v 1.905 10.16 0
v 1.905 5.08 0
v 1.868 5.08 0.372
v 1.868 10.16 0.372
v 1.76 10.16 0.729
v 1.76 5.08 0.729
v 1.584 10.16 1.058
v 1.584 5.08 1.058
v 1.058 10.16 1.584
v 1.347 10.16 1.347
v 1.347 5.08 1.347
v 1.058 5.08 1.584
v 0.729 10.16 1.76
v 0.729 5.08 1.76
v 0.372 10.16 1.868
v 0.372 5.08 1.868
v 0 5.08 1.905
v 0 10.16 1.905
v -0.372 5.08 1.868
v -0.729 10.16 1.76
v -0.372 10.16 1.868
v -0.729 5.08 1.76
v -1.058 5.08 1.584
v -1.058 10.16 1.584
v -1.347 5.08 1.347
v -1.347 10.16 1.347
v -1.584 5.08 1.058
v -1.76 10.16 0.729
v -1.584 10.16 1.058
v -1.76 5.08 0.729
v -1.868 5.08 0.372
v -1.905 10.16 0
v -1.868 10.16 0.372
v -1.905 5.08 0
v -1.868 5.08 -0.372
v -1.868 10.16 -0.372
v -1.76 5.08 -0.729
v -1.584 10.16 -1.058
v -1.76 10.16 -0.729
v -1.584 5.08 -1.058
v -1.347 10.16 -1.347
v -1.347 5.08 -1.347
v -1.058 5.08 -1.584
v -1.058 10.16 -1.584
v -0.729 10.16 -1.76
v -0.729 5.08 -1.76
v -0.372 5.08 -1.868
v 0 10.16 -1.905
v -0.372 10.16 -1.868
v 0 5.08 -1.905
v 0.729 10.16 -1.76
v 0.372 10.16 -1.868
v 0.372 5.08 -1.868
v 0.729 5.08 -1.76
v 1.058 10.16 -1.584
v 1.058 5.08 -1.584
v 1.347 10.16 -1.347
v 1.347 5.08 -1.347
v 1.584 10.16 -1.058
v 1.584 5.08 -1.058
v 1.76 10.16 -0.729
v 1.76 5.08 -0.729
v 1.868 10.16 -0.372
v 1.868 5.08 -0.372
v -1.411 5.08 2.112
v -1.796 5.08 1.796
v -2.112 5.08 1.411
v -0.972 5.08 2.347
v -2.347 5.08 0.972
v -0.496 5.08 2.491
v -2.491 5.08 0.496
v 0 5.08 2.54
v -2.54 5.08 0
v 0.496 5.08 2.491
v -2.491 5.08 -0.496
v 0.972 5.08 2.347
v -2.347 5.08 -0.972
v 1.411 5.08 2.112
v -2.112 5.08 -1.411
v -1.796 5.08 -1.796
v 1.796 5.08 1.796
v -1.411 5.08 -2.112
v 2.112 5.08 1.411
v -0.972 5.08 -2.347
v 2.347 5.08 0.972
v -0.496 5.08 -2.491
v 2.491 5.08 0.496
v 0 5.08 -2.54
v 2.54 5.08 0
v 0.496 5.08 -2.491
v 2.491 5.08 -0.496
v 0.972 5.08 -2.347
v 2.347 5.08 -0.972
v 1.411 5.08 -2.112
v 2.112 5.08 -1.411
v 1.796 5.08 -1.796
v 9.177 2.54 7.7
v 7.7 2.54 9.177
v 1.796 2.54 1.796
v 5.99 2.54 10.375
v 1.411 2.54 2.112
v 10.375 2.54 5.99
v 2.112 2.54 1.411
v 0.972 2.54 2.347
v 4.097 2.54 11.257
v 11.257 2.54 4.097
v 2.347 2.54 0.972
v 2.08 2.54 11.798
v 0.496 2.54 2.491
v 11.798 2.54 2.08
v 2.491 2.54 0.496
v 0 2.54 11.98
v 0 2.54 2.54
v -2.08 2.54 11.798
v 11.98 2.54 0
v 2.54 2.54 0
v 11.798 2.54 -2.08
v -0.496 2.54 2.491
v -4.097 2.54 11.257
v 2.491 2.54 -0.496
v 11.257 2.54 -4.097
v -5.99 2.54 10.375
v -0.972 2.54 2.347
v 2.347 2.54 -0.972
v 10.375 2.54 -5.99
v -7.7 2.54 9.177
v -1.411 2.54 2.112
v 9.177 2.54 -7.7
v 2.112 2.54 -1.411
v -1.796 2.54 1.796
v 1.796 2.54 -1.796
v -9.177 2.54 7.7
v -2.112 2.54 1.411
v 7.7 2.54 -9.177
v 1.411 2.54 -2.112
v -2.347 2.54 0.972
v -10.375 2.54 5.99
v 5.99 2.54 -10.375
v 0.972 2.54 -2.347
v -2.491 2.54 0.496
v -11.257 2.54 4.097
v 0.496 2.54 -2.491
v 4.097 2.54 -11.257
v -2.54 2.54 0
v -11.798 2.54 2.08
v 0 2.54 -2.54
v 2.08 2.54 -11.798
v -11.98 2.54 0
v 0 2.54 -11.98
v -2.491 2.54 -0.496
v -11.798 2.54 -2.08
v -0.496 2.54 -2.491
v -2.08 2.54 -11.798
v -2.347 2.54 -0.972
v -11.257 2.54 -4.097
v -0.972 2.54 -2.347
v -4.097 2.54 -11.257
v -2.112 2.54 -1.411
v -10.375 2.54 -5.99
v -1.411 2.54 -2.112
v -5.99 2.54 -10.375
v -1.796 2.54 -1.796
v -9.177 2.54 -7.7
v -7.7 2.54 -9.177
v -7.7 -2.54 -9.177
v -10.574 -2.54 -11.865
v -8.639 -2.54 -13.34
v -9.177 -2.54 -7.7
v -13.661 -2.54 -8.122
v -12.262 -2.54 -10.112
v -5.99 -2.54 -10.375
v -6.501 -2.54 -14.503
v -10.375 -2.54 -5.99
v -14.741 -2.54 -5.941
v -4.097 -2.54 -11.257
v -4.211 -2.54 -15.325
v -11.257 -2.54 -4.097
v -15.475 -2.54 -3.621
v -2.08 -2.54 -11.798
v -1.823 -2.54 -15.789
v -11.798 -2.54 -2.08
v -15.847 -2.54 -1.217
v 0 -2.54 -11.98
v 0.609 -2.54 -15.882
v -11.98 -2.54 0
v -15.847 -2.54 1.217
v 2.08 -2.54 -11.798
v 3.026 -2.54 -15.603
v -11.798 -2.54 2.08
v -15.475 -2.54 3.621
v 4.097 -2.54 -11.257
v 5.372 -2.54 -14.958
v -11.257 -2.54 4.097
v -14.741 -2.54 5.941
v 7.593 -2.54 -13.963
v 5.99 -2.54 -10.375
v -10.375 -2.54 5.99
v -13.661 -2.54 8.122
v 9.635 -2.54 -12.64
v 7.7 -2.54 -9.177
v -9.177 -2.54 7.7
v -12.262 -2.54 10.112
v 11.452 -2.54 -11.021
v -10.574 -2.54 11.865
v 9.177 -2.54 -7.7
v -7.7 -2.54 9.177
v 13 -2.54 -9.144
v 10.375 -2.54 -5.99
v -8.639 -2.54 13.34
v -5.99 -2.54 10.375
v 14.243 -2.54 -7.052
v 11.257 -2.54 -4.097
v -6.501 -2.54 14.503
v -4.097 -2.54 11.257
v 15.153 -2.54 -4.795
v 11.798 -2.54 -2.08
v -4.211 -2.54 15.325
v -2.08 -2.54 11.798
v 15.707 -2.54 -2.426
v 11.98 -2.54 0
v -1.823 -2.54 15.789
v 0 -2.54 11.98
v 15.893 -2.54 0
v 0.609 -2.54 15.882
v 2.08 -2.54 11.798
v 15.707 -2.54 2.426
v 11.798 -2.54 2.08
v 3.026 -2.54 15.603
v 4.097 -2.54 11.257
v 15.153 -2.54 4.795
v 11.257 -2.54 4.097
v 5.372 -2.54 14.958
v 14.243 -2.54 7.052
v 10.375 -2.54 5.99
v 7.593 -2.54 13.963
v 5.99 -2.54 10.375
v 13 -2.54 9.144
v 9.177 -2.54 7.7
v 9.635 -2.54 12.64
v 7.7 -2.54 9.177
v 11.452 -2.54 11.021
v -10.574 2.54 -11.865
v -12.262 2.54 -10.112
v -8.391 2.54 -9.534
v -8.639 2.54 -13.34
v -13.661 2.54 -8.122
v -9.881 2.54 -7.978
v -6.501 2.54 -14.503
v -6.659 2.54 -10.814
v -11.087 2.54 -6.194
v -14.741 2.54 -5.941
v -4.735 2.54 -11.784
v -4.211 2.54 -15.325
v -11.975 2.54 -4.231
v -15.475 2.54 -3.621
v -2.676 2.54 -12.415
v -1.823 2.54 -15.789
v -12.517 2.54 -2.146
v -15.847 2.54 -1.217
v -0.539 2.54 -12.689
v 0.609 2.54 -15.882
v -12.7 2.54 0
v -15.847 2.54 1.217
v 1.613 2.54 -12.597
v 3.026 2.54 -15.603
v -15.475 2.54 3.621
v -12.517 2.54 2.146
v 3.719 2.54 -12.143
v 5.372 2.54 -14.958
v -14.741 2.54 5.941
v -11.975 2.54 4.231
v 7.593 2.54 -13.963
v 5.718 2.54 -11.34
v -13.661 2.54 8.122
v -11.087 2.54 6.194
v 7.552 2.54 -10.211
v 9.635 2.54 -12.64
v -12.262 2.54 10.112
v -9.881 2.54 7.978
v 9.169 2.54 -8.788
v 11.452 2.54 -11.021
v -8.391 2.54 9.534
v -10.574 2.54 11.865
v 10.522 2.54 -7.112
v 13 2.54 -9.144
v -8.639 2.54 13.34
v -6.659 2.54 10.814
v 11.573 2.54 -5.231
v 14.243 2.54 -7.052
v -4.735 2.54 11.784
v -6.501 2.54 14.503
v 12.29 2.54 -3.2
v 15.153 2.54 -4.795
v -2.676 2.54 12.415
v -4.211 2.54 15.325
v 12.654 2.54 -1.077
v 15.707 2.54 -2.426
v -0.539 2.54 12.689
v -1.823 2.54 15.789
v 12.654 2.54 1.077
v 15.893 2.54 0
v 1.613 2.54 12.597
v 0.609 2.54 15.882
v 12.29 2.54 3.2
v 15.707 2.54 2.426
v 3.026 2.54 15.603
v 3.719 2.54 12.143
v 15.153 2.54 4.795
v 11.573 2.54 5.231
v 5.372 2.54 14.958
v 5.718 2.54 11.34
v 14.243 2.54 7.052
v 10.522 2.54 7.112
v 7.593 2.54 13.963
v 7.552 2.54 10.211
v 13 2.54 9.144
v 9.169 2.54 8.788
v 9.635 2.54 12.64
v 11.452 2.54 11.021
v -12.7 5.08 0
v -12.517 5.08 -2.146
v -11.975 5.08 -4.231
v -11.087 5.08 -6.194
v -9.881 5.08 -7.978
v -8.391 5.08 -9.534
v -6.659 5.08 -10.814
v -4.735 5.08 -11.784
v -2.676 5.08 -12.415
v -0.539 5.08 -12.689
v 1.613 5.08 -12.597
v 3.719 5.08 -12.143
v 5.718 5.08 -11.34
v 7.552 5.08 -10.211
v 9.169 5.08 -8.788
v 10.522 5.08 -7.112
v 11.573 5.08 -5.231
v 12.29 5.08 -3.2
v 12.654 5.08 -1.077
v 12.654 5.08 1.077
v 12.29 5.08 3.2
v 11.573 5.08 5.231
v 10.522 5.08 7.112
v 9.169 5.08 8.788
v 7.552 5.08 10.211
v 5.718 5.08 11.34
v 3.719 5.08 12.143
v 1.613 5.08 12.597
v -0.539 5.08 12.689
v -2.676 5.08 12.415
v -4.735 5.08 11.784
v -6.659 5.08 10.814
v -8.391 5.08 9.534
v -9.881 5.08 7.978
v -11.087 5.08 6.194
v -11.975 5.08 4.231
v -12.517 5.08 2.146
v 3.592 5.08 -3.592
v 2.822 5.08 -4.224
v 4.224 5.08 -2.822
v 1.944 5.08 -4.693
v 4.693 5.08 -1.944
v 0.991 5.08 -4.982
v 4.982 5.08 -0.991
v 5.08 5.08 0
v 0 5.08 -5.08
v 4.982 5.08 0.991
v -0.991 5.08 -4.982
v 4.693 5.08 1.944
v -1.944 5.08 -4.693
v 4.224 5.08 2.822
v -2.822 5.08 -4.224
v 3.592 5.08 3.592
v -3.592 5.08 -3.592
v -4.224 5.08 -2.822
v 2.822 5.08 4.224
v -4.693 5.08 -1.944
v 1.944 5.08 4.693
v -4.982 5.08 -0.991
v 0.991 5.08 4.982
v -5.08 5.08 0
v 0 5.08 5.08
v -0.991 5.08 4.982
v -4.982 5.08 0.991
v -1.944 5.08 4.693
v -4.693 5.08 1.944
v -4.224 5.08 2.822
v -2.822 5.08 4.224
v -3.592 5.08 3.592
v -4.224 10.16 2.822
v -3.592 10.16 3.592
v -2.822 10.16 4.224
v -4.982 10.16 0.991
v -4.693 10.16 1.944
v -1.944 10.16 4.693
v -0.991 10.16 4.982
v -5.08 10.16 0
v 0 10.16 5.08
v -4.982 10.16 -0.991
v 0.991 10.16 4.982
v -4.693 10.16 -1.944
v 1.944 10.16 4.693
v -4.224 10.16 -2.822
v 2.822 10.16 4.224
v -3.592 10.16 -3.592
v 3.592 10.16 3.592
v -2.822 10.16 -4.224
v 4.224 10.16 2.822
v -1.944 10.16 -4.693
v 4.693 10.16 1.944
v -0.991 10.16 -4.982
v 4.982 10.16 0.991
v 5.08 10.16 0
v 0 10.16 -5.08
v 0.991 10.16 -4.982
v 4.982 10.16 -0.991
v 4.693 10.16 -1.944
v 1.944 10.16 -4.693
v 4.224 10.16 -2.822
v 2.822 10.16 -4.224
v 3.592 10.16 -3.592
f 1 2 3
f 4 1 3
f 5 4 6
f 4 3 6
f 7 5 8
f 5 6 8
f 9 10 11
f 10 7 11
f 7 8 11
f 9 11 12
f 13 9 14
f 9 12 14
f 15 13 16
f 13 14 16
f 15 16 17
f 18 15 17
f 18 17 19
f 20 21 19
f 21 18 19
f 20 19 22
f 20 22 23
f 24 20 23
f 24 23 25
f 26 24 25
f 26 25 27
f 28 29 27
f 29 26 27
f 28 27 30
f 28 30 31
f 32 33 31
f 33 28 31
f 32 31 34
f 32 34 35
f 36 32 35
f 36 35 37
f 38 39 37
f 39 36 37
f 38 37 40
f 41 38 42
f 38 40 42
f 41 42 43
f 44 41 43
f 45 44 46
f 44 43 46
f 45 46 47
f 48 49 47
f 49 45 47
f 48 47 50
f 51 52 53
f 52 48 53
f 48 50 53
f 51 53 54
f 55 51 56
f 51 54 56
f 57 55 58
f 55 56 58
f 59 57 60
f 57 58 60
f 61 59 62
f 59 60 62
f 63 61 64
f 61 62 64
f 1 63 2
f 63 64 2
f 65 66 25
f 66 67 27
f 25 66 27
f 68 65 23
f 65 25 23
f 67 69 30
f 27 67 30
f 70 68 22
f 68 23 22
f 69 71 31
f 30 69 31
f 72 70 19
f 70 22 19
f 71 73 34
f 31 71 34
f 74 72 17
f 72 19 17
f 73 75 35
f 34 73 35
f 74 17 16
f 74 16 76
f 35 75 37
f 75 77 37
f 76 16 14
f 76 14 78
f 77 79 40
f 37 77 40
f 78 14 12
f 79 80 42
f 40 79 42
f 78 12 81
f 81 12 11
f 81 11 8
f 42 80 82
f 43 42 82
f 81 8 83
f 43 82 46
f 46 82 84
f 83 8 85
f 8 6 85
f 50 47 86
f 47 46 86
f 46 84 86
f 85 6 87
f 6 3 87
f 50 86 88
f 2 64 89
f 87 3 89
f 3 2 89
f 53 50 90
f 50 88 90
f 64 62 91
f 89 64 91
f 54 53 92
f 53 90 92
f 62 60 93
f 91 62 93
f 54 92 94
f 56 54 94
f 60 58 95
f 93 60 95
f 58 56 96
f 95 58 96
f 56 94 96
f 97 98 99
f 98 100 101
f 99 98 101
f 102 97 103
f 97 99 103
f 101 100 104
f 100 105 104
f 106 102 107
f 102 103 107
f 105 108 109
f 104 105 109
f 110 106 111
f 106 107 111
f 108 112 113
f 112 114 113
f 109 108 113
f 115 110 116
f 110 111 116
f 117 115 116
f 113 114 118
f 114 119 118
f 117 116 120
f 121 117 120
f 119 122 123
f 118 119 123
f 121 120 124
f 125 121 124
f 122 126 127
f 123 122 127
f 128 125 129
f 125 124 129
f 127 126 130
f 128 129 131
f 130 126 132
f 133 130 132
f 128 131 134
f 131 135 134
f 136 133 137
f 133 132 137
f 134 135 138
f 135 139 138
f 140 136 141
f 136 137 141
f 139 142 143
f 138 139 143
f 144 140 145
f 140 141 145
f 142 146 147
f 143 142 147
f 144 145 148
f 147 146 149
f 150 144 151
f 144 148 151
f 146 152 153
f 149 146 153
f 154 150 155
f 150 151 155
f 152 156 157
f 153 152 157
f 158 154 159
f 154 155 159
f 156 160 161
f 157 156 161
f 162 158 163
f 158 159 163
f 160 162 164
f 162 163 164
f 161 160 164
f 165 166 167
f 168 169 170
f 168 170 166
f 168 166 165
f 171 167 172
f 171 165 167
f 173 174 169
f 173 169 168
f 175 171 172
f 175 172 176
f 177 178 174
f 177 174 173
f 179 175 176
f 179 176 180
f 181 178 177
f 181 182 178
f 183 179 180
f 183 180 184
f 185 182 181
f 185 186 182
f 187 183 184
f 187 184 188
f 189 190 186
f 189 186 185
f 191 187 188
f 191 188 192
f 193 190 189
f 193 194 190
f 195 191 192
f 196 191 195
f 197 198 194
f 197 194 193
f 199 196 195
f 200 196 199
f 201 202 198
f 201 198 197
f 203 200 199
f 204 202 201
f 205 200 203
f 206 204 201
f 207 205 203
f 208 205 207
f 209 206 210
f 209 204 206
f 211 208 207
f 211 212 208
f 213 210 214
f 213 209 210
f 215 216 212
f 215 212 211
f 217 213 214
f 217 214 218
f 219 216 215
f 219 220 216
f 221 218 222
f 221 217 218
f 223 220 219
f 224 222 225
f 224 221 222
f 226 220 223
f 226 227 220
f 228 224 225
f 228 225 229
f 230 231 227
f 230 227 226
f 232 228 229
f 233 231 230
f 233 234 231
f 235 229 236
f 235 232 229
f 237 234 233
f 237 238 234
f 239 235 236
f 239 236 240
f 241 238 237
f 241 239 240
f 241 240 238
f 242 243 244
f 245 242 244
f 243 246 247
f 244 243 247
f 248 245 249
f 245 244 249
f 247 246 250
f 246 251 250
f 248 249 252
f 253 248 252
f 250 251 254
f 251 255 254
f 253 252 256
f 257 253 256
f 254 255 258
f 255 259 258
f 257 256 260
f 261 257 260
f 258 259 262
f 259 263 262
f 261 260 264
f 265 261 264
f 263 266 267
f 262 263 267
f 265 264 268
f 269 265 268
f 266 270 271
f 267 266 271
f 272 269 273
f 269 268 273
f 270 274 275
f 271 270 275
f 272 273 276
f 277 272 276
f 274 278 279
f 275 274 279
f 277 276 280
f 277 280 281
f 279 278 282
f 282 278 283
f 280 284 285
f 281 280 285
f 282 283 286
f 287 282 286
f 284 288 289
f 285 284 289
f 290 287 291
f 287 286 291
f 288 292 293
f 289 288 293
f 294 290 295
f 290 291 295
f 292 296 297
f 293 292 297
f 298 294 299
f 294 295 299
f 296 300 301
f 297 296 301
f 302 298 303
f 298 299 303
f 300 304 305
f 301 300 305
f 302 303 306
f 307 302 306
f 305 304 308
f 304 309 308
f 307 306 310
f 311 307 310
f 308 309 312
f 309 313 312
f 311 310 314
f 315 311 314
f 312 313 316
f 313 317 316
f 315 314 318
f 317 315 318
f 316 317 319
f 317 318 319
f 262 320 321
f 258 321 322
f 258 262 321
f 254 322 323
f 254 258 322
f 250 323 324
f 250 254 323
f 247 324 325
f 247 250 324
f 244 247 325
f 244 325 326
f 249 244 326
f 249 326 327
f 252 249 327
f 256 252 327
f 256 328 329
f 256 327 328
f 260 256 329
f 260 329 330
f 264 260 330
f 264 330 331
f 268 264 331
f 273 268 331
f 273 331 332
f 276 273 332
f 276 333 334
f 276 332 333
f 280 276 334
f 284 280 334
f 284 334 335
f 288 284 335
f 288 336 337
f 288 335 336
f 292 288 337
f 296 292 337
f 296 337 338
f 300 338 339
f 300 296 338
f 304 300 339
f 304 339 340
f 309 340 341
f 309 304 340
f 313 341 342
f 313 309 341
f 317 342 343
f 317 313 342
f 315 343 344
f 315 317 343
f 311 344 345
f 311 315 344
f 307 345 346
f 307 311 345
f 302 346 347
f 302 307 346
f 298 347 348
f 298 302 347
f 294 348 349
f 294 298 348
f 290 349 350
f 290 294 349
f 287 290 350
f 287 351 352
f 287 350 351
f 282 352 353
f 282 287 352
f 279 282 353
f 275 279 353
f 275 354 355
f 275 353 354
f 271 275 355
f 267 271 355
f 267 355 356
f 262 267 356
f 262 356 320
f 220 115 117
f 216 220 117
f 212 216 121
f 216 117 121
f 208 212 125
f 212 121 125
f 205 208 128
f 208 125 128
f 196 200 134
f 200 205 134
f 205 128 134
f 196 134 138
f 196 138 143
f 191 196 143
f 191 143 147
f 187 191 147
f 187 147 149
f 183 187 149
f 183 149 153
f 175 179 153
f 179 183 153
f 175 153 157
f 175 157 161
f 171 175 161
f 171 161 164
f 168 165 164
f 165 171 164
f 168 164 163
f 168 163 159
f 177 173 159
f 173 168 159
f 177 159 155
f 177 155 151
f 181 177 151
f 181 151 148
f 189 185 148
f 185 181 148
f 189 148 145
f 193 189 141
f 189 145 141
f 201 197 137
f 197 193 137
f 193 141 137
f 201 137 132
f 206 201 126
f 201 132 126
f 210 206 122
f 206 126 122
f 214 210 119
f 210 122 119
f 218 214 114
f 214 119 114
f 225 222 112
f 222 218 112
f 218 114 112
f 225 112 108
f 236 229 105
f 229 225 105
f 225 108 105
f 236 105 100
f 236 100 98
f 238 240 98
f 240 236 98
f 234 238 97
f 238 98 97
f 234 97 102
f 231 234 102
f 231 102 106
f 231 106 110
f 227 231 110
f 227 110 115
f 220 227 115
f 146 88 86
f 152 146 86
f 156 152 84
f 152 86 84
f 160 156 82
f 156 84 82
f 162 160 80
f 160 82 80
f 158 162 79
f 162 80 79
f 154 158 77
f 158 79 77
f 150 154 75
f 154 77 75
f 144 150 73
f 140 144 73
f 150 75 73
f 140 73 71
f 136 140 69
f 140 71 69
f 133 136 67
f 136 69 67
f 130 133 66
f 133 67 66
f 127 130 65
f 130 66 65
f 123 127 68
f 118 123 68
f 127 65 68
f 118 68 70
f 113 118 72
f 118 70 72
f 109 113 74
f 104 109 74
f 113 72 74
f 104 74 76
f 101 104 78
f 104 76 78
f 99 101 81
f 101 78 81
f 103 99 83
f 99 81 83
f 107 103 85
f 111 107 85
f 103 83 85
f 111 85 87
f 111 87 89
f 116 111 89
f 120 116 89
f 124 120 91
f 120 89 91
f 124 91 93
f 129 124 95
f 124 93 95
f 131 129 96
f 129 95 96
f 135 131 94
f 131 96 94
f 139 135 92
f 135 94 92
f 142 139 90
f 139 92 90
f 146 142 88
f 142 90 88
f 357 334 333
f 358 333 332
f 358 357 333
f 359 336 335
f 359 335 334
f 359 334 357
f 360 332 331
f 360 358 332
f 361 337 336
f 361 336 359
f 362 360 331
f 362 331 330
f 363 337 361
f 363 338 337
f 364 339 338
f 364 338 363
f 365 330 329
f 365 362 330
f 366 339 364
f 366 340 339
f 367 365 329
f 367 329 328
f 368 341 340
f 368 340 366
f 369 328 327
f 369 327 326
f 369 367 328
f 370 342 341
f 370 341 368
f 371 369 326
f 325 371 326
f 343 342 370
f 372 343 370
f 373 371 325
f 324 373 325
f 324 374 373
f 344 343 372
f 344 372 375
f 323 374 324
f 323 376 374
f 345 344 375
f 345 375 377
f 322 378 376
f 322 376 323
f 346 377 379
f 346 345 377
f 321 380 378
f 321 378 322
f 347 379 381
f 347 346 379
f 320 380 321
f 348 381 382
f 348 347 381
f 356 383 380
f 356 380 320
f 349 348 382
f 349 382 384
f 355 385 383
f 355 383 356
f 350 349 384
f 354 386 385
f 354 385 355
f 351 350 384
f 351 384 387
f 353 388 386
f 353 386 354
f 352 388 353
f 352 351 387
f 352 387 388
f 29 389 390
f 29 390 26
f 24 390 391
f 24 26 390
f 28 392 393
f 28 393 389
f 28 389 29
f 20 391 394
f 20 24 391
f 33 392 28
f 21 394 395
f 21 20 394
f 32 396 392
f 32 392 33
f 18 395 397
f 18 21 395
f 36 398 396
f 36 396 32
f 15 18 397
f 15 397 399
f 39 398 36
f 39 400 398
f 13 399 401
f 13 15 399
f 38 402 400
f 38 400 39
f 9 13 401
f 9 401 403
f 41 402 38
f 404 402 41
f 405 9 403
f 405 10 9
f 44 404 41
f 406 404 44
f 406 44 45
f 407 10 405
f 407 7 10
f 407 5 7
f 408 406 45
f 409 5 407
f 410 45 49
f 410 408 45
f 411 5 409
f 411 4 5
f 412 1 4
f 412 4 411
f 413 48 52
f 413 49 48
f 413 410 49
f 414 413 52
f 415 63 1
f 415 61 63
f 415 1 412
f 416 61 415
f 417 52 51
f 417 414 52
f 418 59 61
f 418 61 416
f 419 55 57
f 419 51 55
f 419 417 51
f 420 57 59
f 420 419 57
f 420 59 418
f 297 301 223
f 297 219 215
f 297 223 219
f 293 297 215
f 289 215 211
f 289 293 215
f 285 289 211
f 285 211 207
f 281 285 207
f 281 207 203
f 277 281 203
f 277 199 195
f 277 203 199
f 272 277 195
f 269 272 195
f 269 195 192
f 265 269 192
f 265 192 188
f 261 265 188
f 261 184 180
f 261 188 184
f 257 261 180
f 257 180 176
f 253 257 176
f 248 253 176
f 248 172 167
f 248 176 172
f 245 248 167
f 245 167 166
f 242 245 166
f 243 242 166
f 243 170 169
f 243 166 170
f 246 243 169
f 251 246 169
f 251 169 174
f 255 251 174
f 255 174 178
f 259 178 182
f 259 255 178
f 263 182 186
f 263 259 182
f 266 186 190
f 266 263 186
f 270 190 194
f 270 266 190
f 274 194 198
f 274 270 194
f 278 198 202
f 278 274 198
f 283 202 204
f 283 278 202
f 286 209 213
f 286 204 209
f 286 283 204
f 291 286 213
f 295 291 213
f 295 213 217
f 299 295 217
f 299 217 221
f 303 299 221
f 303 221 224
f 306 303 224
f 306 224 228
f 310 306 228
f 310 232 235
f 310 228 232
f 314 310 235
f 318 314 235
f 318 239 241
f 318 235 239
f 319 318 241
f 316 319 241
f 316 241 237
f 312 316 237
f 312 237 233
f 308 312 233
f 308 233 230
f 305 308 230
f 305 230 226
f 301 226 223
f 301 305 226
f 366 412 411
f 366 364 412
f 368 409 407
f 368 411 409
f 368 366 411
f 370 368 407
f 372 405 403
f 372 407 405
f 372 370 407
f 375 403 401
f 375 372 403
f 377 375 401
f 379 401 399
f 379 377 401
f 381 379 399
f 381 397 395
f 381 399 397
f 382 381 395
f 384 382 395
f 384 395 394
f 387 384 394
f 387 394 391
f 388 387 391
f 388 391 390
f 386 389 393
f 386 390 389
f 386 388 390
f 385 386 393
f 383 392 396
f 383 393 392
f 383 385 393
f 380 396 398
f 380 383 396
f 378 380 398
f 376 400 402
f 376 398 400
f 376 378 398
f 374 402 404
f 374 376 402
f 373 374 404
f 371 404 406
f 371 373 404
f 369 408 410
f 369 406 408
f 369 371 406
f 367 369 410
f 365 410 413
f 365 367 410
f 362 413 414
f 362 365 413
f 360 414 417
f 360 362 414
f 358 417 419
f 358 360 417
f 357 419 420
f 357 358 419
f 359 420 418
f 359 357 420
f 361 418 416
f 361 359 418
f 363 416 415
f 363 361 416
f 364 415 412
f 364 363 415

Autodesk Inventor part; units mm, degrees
ref_plane "YZ Plane" through (0, 0, 0) normal (1, 0, 0) x (0, 1, 0)
ref_plane "XZ Plane" through (0, 0, 0) normal (0, 1, 0) x (-1, 0, 0)
ref_plane "XY Plane" through (0, 0, 0) normal (0, 0, 1) x (1, 0, 0)
sketch "Sketch1" plane through (0, 0, 0) normal (0, 1, 0) x (-1, 0, 0)
  circle A0 centre (0, 0) radius 12.7
  dimension "d1" = 25.4
extrude "Extrusion3" add sketch "Sketch1" along normal blind 5.08
sketch "Sketch3" plane through (0, 0, 0) normal (0, -1, 0) x (1, 0, 0)
  circle A0 centre (0, 0) radius 0.4685
hole "Hole1" at (0, 0, 0) direction (0, 1, 0) diameter 5.08 end through all counterbore diameter 38.1 counterbore depth 2.54
sketch "Sketch4" plane through (0, 2.54, 0) normal (0, -1, 0) x (1, 0, 0)
  circle A0 centre (0, 0) radius 11.9796
  circle A1 centre (0, 0) radius 19.05
  circle A2 centre (0, 0) radius 15.8934
extrude "Extrusion4" add sketch "Sketch4" along normal blind 5.08 contours A2
sketch "Sketch5" plane through (0, 5.08, 0) normal (0, 1, 0) x (1, 0, 0)
  point P0 (0, 0)
sketch "Sketch6" plane through (0, 5.08, 0) normal (0, 1, 0) x (1, 0, 0)
  circle A0 centre (0, 0) radius 5.08
  dimension "d19" = 10.16
sketch "Sketch7" plane through (0, 5.08, 0) normal (0, 1, 0) x (1, 0, 0)
  circle A0 centre (0, 0) radius 1.905
  dimension "d24" = 3.81
extrude "Extrusion5" add sketch "Sketch6" along normal blind 5.08
extrude "Extrusion6" cut sketch "Sketch7" along normal blind 5.08
properties part number "NEWWHEELS"
